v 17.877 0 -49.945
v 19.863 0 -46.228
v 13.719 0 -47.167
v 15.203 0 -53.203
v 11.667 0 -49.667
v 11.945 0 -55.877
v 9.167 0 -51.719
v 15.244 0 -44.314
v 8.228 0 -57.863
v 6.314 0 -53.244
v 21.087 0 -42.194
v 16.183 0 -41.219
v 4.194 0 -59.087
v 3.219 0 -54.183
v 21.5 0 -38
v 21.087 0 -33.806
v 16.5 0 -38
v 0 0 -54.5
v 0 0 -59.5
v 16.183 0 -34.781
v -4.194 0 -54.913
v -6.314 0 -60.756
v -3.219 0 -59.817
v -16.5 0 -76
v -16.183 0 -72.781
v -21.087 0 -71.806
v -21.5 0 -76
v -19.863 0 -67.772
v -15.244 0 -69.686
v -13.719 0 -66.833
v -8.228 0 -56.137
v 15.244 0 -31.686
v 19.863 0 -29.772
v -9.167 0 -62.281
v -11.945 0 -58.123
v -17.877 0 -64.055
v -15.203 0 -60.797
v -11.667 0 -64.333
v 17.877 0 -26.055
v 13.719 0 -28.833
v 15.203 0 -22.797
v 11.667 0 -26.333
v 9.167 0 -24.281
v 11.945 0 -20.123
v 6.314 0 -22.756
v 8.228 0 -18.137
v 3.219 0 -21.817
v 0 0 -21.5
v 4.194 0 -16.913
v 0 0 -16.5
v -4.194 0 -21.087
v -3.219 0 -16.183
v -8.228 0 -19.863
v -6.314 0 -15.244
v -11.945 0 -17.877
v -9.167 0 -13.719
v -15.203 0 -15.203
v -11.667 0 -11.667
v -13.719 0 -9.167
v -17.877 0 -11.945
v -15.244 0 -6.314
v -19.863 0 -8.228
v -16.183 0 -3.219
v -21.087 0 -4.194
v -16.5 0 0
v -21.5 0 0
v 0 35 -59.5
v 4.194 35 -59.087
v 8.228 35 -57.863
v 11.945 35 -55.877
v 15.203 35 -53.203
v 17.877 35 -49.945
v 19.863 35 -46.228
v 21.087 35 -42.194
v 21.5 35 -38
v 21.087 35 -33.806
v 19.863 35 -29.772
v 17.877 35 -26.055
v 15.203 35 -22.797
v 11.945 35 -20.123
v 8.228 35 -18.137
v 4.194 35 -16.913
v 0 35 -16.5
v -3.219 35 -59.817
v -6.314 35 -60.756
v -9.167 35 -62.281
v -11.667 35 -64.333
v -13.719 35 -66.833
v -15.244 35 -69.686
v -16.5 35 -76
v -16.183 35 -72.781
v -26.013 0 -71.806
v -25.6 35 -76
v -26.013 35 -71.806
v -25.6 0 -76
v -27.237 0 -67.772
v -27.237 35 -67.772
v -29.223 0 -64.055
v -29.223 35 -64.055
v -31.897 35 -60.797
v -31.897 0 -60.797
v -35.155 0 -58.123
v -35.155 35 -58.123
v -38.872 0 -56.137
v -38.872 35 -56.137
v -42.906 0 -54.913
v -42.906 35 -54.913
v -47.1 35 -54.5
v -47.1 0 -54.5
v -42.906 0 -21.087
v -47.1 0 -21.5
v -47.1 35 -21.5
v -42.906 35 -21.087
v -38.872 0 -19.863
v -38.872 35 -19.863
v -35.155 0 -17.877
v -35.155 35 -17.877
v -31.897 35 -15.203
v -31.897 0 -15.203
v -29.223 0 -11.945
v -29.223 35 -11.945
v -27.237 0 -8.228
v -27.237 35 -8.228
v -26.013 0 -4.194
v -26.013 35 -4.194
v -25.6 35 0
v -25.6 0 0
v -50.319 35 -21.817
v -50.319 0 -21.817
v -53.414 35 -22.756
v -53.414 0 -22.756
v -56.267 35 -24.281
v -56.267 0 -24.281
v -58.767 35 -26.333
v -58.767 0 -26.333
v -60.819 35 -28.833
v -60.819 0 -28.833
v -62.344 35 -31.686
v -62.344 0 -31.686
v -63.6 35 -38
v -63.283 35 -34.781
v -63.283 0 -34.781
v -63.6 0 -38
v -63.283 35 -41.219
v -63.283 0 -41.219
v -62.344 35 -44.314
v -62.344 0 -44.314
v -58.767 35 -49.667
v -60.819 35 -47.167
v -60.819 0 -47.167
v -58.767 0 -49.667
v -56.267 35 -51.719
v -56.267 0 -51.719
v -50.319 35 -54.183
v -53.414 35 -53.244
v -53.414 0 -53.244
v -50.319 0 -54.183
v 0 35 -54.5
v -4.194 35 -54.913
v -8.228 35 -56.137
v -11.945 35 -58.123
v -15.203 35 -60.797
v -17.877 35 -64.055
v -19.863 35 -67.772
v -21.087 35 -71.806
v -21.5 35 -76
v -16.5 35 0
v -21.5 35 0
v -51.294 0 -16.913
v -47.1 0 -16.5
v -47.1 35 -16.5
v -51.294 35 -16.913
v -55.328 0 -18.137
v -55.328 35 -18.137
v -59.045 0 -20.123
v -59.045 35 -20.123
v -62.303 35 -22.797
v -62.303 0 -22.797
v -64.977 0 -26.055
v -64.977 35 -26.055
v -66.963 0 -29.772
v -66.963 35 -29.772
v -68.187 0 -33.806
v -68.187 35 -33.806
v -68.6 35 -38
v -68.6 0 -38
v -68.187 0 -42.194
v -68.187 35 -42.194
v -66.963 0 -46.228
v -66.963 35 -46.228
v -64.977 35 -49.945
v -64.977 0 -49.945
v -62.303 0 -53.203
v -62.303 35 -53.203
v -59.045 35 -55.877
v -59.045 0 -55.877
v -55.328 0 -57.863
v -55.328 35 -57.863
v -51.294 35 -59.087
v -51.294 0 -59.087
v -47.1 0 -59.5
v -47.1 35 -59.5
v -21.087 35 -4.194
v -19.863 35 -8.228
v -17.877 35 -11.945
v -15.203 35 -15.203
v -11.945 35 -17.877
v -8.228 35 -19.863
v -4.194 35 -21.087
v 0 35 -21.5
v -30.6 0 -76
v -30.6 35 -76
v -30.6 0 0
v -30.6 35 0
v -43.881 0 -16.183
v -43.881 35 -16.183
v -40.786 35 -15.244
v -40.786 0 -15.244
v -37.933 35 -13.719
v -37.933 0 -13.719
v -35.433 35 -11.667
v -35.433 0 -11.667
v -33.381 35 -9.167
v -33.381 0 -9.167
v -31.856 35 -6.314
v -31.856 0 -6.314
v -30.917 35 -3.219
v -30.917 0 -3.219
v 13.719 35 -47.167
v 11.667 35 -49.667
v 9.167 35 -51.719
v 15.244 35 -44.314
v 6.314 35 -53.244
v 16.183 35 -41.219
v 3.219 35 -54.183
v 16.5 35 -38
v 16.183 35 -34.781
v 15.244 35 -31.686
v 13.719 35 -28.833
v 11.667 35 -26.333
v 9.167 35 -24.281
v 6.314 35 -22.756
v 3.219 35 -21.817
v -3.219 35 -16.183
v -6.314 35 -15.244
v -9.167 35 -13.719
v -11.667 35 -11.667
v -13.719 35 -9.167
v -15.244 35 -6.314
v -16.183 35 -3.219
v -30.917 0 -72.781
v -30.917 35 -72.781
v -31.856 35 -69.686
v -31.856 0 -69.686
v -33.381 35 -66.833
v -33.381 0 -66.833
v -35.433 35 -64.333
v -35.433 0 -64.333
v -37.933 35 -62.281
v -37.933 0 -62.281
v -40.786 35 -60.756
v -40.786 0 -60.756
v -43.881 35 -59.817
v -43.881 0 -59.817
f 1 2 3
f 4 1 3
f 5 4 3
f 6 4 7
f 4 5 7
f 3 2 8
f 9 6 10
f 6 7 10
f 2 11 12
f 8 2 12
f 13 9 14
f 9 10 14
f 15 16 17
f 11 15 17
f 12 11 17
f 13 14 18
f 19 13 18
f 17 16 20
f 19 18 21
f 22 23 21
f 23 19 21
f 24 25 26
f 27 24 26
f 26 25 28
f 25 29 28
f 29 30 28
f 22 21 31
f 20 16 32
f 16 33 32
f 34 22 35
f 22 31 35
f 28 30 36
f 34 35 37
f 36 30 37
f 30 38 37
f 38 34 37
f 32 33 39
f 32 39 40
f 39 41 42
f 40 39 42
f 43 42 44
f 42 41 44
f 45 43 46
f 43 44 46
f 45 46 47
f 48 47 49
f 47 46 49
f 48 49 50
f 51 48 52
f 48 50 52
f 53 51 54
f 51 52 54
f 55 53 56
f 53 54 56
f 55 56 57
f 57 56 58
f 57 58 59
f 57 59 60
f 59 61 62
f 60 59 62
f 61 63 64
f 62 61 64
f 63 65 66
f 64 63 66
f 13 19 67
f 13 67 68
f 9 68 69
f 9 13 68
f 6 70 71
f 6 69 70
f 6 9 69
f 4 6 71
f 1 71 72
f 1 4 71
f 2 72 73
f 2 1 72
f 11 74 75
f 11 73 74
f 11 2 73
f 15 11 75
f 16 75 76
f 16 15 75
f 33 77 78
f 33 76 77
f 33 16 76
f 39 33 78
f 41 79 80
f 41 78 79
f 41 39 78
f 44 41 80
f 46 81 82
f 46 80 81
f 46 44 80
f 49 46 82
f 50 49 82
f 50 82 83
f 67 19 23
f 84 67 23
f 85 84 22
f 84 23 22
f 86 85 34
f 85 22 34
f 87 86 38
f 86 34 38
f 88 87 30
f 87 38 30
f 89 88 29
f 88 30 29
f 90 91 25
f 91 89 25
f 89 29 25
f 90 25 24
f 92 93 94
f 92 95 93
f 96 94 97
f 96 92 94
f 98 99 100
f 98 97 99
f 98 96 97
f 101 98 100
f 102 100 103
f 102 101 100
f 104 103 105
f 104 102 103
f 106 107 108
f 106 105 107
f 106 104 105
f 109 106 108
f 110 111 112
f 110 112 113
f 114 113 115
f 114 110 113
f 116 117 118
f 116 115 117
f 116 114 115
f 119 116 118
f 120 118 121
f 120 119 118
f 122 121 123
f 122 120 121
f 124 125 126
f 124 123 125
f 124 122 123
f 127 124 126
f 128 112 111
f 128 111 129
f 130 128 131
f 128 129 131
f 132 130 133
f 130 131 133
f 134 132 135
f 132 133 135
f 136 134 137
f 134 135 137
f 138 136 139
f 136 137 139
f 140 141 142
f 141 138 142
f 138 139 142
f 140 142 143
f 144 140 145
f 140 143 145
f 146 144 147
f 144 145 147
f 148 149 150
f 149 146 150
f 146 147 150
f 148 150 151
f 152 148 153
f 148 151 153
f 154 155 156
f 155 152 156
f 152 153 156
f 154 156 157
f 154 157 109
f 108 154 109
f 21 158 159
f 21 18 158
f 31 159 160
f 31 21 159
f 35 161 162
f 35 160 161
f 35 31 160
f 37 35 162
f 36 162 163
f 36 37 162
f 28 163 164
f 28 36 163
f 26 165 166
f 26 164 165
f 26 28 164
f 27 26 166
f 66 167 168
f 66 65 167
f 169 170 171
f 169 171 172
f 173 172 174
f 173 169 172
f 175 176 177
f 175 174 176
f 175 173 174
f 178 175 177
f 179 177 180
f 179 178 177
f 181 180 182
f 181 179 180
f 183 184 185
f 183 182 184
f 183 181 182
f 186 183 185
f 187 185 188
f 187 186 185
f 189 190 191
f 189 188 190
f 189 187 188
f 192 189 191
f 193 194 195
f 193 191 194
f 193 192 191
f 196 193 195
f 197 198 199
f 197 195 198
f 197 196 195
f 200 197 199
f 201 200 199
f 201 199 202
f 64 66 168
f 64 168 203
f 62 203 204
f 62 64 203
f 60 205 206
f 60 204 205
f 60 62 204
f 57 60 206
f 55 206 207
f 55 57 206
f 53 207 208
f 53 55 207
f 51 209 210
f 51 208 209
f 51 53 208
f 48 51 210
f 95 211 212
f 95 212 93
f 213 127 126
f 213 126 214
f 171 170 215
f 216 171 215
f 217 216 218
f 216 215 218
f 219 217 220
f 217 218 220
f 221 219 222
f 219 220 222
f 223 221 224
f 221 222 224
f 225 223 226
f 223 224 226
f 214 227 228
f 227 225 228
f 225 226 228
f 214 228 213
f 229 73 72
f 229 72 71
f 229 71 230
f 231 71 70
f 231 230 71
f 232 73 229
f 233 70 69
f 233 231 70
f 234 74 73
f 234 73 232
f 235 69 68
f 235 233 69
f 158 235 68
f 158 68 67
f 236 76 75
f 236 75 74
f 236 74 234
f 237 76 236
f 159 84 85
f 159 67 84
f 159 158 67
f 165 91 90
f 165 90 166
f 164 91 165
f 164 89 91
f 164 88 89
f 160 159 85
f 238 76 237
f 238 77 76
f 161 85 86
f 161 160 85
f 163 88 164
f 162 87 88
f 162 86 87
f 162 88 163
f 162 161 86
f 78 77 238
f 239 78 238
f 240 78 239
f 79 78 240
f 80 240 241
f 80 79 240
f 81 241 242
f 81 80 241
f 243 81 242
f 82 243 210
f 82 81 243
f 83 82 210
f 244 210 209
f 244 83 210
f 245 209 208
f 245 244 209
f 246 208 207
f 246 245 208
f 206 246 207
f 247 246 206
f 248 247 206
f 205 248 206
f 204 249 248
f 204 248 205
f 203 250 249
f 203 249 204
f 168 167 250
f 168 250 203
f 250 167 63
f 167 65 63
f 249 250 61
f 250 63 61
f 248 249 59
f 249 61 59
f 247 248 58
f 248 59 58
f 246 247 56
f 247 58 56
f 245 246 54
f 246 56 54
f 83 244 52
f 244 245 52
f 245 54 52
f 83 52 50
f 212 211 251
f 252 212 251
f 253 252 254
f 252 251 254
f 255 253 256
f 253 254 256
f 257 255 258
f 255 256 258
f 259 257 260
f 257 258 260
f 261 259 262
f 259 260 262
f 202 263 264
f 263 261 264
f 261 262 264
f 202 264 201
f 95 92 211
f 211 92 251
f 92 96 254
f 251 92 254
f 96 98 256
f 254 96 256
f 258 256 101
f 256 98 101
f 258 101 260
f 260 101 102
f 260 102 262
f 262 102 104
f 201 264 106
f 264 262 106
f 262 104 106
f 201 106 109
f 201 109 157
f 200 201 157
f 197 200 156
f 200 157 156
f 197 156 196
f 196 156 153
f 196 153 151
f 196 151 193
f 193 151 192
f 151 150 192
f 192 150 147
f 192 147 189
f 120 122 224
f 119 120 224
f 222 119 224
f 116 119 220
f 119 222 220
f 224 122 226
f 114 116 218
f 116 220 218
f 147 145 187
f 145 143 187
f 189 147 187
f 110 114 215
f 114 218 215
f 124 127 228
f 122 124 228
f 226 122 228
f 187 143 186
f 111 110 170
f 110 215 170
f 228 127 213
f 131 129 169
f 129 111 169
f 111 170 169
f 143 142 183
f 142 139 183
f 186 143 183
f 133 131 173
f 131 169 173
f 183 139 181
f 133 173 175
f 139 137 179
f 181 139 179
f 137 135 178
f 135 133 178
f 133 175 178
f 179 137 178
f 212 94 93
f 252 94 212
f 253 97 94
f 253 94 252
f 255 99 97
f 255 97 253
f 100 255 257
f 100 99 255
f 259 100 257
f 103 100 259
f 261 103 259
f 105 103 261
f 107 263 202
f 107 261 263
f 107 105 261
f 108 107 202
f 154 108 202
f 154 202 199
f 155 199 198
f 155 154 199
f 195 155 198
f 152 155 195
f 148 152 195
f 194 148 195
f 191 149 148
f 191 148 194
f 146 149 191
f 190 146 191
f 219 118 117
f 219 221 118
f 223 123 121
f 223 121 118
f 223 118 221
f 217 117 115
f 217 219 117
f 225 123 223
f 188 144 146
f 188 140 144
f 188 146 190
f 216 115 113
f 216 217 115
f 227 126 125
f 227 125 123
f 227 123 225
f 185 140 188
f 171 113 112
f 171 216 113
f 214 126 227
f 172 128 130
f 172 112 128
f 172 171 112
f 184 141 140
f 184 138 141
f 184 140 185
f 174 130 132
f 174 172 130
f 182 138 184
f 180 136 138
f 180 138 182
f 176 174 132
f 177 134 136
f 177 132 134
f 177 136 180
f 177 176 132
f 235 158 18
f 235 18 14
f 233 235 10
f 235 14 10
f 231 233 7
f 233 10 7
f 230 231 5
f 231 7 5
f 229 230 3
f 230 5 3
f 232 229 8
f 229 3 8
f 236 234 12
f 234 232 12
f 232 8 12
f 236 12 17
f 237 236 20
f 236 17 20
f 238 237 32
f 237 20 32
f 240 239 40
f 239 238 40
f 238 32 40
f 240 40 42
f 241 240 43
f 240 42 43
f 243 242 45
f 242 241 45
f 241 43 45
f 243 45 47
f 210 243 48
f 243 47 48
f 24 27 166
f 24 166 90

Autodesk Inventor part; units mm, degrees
ref_plane "YZ Plane" through (0, 0, 0) normal (1, 0, 0) x (0, 1, 0)
ref_plane "XZ Plane" through (0, 0, 0) normal (0, 1, 0) x (-1, 0, 0)
ref_plane "XY Plane" through (0, 0, 0) normal (0, 0, 1) x (1, 0, 0)
sketch "Sketch1" plane through (0, 0, 0) normal (0, 1, 0) x (-1, 0, 0)
  line L0 (0, 0) -> (47.1, 0)
  line L1 (47.1, -76) -> (0, -76)
  line L2 (47.1, 0) -> (100.8601, 0) construction
  arc A0 (47.1, -59.5) -> (47.1, -16.5) centre (47.1, -38) ccw
  arc A1 (47.1, -54.5) -> (47.1, -21.5) centre (47.1, -38) ccw
  arc A2 (25.6, 0) -> (47.1, -21.5) centre (47.1, 0) ccw
  arc A3 (30.6, 0) -> (47.1, -16.5) centre (47.1, 0) ccw
  arc A4 (47.1, -54.5) -> (25.6, -76) centre (47.1, -76) ccw
  arc A5 (47.1, -59.5) -> (30.6, -76) centre (47.1, -76) ccw
  arc A6 (0, -16.5) -> (0, -59.5) centre (0, -38) ccw
  arc A7 (0, -21.5) -> (0, -54.5) centre (0, -38) ccw
  arc A8 (0, -21.5) -> (21.5, 0) centre (0, 0) ccw
  arc A9 (0, -16.5) -> (16.5, 0) centre (0, 0) ccw
  arc A10 (21.5, -76) -> (0, -54.5) centre (0, -76) ccw
  arc A11 (16.5, -76) -> (0, -59.5) centre (0, -76) ccw
  dimension "d0" = 47.1
  dimension "d1" = 76
  dimension "d5" = 43
  dimension "d6" = 33
  dimension "d8" = 43
extrude "Extrusion1" add sketch "Sketch1" along normal blind 35 contours L0 A8 A7 A10 L1 A11 A6 A9 | L0 A3 A0 A5 L1 A4 A1 A2
ref_plane "Work Plane3" through (-23.55, 0, 0) normal (1, 0, 0) x (0, 1, 0)
ref_plane "Work Plane1" through (-21.5, 0, 0) normal (1, 0, 0) x (0, 1, 0)
ref_plane "Work Plane2" through (-25.6, 0, 0) normal (1, 0, 0) x (0, 1, 0)
properties part number "150x0y0z_0x0y0z"
